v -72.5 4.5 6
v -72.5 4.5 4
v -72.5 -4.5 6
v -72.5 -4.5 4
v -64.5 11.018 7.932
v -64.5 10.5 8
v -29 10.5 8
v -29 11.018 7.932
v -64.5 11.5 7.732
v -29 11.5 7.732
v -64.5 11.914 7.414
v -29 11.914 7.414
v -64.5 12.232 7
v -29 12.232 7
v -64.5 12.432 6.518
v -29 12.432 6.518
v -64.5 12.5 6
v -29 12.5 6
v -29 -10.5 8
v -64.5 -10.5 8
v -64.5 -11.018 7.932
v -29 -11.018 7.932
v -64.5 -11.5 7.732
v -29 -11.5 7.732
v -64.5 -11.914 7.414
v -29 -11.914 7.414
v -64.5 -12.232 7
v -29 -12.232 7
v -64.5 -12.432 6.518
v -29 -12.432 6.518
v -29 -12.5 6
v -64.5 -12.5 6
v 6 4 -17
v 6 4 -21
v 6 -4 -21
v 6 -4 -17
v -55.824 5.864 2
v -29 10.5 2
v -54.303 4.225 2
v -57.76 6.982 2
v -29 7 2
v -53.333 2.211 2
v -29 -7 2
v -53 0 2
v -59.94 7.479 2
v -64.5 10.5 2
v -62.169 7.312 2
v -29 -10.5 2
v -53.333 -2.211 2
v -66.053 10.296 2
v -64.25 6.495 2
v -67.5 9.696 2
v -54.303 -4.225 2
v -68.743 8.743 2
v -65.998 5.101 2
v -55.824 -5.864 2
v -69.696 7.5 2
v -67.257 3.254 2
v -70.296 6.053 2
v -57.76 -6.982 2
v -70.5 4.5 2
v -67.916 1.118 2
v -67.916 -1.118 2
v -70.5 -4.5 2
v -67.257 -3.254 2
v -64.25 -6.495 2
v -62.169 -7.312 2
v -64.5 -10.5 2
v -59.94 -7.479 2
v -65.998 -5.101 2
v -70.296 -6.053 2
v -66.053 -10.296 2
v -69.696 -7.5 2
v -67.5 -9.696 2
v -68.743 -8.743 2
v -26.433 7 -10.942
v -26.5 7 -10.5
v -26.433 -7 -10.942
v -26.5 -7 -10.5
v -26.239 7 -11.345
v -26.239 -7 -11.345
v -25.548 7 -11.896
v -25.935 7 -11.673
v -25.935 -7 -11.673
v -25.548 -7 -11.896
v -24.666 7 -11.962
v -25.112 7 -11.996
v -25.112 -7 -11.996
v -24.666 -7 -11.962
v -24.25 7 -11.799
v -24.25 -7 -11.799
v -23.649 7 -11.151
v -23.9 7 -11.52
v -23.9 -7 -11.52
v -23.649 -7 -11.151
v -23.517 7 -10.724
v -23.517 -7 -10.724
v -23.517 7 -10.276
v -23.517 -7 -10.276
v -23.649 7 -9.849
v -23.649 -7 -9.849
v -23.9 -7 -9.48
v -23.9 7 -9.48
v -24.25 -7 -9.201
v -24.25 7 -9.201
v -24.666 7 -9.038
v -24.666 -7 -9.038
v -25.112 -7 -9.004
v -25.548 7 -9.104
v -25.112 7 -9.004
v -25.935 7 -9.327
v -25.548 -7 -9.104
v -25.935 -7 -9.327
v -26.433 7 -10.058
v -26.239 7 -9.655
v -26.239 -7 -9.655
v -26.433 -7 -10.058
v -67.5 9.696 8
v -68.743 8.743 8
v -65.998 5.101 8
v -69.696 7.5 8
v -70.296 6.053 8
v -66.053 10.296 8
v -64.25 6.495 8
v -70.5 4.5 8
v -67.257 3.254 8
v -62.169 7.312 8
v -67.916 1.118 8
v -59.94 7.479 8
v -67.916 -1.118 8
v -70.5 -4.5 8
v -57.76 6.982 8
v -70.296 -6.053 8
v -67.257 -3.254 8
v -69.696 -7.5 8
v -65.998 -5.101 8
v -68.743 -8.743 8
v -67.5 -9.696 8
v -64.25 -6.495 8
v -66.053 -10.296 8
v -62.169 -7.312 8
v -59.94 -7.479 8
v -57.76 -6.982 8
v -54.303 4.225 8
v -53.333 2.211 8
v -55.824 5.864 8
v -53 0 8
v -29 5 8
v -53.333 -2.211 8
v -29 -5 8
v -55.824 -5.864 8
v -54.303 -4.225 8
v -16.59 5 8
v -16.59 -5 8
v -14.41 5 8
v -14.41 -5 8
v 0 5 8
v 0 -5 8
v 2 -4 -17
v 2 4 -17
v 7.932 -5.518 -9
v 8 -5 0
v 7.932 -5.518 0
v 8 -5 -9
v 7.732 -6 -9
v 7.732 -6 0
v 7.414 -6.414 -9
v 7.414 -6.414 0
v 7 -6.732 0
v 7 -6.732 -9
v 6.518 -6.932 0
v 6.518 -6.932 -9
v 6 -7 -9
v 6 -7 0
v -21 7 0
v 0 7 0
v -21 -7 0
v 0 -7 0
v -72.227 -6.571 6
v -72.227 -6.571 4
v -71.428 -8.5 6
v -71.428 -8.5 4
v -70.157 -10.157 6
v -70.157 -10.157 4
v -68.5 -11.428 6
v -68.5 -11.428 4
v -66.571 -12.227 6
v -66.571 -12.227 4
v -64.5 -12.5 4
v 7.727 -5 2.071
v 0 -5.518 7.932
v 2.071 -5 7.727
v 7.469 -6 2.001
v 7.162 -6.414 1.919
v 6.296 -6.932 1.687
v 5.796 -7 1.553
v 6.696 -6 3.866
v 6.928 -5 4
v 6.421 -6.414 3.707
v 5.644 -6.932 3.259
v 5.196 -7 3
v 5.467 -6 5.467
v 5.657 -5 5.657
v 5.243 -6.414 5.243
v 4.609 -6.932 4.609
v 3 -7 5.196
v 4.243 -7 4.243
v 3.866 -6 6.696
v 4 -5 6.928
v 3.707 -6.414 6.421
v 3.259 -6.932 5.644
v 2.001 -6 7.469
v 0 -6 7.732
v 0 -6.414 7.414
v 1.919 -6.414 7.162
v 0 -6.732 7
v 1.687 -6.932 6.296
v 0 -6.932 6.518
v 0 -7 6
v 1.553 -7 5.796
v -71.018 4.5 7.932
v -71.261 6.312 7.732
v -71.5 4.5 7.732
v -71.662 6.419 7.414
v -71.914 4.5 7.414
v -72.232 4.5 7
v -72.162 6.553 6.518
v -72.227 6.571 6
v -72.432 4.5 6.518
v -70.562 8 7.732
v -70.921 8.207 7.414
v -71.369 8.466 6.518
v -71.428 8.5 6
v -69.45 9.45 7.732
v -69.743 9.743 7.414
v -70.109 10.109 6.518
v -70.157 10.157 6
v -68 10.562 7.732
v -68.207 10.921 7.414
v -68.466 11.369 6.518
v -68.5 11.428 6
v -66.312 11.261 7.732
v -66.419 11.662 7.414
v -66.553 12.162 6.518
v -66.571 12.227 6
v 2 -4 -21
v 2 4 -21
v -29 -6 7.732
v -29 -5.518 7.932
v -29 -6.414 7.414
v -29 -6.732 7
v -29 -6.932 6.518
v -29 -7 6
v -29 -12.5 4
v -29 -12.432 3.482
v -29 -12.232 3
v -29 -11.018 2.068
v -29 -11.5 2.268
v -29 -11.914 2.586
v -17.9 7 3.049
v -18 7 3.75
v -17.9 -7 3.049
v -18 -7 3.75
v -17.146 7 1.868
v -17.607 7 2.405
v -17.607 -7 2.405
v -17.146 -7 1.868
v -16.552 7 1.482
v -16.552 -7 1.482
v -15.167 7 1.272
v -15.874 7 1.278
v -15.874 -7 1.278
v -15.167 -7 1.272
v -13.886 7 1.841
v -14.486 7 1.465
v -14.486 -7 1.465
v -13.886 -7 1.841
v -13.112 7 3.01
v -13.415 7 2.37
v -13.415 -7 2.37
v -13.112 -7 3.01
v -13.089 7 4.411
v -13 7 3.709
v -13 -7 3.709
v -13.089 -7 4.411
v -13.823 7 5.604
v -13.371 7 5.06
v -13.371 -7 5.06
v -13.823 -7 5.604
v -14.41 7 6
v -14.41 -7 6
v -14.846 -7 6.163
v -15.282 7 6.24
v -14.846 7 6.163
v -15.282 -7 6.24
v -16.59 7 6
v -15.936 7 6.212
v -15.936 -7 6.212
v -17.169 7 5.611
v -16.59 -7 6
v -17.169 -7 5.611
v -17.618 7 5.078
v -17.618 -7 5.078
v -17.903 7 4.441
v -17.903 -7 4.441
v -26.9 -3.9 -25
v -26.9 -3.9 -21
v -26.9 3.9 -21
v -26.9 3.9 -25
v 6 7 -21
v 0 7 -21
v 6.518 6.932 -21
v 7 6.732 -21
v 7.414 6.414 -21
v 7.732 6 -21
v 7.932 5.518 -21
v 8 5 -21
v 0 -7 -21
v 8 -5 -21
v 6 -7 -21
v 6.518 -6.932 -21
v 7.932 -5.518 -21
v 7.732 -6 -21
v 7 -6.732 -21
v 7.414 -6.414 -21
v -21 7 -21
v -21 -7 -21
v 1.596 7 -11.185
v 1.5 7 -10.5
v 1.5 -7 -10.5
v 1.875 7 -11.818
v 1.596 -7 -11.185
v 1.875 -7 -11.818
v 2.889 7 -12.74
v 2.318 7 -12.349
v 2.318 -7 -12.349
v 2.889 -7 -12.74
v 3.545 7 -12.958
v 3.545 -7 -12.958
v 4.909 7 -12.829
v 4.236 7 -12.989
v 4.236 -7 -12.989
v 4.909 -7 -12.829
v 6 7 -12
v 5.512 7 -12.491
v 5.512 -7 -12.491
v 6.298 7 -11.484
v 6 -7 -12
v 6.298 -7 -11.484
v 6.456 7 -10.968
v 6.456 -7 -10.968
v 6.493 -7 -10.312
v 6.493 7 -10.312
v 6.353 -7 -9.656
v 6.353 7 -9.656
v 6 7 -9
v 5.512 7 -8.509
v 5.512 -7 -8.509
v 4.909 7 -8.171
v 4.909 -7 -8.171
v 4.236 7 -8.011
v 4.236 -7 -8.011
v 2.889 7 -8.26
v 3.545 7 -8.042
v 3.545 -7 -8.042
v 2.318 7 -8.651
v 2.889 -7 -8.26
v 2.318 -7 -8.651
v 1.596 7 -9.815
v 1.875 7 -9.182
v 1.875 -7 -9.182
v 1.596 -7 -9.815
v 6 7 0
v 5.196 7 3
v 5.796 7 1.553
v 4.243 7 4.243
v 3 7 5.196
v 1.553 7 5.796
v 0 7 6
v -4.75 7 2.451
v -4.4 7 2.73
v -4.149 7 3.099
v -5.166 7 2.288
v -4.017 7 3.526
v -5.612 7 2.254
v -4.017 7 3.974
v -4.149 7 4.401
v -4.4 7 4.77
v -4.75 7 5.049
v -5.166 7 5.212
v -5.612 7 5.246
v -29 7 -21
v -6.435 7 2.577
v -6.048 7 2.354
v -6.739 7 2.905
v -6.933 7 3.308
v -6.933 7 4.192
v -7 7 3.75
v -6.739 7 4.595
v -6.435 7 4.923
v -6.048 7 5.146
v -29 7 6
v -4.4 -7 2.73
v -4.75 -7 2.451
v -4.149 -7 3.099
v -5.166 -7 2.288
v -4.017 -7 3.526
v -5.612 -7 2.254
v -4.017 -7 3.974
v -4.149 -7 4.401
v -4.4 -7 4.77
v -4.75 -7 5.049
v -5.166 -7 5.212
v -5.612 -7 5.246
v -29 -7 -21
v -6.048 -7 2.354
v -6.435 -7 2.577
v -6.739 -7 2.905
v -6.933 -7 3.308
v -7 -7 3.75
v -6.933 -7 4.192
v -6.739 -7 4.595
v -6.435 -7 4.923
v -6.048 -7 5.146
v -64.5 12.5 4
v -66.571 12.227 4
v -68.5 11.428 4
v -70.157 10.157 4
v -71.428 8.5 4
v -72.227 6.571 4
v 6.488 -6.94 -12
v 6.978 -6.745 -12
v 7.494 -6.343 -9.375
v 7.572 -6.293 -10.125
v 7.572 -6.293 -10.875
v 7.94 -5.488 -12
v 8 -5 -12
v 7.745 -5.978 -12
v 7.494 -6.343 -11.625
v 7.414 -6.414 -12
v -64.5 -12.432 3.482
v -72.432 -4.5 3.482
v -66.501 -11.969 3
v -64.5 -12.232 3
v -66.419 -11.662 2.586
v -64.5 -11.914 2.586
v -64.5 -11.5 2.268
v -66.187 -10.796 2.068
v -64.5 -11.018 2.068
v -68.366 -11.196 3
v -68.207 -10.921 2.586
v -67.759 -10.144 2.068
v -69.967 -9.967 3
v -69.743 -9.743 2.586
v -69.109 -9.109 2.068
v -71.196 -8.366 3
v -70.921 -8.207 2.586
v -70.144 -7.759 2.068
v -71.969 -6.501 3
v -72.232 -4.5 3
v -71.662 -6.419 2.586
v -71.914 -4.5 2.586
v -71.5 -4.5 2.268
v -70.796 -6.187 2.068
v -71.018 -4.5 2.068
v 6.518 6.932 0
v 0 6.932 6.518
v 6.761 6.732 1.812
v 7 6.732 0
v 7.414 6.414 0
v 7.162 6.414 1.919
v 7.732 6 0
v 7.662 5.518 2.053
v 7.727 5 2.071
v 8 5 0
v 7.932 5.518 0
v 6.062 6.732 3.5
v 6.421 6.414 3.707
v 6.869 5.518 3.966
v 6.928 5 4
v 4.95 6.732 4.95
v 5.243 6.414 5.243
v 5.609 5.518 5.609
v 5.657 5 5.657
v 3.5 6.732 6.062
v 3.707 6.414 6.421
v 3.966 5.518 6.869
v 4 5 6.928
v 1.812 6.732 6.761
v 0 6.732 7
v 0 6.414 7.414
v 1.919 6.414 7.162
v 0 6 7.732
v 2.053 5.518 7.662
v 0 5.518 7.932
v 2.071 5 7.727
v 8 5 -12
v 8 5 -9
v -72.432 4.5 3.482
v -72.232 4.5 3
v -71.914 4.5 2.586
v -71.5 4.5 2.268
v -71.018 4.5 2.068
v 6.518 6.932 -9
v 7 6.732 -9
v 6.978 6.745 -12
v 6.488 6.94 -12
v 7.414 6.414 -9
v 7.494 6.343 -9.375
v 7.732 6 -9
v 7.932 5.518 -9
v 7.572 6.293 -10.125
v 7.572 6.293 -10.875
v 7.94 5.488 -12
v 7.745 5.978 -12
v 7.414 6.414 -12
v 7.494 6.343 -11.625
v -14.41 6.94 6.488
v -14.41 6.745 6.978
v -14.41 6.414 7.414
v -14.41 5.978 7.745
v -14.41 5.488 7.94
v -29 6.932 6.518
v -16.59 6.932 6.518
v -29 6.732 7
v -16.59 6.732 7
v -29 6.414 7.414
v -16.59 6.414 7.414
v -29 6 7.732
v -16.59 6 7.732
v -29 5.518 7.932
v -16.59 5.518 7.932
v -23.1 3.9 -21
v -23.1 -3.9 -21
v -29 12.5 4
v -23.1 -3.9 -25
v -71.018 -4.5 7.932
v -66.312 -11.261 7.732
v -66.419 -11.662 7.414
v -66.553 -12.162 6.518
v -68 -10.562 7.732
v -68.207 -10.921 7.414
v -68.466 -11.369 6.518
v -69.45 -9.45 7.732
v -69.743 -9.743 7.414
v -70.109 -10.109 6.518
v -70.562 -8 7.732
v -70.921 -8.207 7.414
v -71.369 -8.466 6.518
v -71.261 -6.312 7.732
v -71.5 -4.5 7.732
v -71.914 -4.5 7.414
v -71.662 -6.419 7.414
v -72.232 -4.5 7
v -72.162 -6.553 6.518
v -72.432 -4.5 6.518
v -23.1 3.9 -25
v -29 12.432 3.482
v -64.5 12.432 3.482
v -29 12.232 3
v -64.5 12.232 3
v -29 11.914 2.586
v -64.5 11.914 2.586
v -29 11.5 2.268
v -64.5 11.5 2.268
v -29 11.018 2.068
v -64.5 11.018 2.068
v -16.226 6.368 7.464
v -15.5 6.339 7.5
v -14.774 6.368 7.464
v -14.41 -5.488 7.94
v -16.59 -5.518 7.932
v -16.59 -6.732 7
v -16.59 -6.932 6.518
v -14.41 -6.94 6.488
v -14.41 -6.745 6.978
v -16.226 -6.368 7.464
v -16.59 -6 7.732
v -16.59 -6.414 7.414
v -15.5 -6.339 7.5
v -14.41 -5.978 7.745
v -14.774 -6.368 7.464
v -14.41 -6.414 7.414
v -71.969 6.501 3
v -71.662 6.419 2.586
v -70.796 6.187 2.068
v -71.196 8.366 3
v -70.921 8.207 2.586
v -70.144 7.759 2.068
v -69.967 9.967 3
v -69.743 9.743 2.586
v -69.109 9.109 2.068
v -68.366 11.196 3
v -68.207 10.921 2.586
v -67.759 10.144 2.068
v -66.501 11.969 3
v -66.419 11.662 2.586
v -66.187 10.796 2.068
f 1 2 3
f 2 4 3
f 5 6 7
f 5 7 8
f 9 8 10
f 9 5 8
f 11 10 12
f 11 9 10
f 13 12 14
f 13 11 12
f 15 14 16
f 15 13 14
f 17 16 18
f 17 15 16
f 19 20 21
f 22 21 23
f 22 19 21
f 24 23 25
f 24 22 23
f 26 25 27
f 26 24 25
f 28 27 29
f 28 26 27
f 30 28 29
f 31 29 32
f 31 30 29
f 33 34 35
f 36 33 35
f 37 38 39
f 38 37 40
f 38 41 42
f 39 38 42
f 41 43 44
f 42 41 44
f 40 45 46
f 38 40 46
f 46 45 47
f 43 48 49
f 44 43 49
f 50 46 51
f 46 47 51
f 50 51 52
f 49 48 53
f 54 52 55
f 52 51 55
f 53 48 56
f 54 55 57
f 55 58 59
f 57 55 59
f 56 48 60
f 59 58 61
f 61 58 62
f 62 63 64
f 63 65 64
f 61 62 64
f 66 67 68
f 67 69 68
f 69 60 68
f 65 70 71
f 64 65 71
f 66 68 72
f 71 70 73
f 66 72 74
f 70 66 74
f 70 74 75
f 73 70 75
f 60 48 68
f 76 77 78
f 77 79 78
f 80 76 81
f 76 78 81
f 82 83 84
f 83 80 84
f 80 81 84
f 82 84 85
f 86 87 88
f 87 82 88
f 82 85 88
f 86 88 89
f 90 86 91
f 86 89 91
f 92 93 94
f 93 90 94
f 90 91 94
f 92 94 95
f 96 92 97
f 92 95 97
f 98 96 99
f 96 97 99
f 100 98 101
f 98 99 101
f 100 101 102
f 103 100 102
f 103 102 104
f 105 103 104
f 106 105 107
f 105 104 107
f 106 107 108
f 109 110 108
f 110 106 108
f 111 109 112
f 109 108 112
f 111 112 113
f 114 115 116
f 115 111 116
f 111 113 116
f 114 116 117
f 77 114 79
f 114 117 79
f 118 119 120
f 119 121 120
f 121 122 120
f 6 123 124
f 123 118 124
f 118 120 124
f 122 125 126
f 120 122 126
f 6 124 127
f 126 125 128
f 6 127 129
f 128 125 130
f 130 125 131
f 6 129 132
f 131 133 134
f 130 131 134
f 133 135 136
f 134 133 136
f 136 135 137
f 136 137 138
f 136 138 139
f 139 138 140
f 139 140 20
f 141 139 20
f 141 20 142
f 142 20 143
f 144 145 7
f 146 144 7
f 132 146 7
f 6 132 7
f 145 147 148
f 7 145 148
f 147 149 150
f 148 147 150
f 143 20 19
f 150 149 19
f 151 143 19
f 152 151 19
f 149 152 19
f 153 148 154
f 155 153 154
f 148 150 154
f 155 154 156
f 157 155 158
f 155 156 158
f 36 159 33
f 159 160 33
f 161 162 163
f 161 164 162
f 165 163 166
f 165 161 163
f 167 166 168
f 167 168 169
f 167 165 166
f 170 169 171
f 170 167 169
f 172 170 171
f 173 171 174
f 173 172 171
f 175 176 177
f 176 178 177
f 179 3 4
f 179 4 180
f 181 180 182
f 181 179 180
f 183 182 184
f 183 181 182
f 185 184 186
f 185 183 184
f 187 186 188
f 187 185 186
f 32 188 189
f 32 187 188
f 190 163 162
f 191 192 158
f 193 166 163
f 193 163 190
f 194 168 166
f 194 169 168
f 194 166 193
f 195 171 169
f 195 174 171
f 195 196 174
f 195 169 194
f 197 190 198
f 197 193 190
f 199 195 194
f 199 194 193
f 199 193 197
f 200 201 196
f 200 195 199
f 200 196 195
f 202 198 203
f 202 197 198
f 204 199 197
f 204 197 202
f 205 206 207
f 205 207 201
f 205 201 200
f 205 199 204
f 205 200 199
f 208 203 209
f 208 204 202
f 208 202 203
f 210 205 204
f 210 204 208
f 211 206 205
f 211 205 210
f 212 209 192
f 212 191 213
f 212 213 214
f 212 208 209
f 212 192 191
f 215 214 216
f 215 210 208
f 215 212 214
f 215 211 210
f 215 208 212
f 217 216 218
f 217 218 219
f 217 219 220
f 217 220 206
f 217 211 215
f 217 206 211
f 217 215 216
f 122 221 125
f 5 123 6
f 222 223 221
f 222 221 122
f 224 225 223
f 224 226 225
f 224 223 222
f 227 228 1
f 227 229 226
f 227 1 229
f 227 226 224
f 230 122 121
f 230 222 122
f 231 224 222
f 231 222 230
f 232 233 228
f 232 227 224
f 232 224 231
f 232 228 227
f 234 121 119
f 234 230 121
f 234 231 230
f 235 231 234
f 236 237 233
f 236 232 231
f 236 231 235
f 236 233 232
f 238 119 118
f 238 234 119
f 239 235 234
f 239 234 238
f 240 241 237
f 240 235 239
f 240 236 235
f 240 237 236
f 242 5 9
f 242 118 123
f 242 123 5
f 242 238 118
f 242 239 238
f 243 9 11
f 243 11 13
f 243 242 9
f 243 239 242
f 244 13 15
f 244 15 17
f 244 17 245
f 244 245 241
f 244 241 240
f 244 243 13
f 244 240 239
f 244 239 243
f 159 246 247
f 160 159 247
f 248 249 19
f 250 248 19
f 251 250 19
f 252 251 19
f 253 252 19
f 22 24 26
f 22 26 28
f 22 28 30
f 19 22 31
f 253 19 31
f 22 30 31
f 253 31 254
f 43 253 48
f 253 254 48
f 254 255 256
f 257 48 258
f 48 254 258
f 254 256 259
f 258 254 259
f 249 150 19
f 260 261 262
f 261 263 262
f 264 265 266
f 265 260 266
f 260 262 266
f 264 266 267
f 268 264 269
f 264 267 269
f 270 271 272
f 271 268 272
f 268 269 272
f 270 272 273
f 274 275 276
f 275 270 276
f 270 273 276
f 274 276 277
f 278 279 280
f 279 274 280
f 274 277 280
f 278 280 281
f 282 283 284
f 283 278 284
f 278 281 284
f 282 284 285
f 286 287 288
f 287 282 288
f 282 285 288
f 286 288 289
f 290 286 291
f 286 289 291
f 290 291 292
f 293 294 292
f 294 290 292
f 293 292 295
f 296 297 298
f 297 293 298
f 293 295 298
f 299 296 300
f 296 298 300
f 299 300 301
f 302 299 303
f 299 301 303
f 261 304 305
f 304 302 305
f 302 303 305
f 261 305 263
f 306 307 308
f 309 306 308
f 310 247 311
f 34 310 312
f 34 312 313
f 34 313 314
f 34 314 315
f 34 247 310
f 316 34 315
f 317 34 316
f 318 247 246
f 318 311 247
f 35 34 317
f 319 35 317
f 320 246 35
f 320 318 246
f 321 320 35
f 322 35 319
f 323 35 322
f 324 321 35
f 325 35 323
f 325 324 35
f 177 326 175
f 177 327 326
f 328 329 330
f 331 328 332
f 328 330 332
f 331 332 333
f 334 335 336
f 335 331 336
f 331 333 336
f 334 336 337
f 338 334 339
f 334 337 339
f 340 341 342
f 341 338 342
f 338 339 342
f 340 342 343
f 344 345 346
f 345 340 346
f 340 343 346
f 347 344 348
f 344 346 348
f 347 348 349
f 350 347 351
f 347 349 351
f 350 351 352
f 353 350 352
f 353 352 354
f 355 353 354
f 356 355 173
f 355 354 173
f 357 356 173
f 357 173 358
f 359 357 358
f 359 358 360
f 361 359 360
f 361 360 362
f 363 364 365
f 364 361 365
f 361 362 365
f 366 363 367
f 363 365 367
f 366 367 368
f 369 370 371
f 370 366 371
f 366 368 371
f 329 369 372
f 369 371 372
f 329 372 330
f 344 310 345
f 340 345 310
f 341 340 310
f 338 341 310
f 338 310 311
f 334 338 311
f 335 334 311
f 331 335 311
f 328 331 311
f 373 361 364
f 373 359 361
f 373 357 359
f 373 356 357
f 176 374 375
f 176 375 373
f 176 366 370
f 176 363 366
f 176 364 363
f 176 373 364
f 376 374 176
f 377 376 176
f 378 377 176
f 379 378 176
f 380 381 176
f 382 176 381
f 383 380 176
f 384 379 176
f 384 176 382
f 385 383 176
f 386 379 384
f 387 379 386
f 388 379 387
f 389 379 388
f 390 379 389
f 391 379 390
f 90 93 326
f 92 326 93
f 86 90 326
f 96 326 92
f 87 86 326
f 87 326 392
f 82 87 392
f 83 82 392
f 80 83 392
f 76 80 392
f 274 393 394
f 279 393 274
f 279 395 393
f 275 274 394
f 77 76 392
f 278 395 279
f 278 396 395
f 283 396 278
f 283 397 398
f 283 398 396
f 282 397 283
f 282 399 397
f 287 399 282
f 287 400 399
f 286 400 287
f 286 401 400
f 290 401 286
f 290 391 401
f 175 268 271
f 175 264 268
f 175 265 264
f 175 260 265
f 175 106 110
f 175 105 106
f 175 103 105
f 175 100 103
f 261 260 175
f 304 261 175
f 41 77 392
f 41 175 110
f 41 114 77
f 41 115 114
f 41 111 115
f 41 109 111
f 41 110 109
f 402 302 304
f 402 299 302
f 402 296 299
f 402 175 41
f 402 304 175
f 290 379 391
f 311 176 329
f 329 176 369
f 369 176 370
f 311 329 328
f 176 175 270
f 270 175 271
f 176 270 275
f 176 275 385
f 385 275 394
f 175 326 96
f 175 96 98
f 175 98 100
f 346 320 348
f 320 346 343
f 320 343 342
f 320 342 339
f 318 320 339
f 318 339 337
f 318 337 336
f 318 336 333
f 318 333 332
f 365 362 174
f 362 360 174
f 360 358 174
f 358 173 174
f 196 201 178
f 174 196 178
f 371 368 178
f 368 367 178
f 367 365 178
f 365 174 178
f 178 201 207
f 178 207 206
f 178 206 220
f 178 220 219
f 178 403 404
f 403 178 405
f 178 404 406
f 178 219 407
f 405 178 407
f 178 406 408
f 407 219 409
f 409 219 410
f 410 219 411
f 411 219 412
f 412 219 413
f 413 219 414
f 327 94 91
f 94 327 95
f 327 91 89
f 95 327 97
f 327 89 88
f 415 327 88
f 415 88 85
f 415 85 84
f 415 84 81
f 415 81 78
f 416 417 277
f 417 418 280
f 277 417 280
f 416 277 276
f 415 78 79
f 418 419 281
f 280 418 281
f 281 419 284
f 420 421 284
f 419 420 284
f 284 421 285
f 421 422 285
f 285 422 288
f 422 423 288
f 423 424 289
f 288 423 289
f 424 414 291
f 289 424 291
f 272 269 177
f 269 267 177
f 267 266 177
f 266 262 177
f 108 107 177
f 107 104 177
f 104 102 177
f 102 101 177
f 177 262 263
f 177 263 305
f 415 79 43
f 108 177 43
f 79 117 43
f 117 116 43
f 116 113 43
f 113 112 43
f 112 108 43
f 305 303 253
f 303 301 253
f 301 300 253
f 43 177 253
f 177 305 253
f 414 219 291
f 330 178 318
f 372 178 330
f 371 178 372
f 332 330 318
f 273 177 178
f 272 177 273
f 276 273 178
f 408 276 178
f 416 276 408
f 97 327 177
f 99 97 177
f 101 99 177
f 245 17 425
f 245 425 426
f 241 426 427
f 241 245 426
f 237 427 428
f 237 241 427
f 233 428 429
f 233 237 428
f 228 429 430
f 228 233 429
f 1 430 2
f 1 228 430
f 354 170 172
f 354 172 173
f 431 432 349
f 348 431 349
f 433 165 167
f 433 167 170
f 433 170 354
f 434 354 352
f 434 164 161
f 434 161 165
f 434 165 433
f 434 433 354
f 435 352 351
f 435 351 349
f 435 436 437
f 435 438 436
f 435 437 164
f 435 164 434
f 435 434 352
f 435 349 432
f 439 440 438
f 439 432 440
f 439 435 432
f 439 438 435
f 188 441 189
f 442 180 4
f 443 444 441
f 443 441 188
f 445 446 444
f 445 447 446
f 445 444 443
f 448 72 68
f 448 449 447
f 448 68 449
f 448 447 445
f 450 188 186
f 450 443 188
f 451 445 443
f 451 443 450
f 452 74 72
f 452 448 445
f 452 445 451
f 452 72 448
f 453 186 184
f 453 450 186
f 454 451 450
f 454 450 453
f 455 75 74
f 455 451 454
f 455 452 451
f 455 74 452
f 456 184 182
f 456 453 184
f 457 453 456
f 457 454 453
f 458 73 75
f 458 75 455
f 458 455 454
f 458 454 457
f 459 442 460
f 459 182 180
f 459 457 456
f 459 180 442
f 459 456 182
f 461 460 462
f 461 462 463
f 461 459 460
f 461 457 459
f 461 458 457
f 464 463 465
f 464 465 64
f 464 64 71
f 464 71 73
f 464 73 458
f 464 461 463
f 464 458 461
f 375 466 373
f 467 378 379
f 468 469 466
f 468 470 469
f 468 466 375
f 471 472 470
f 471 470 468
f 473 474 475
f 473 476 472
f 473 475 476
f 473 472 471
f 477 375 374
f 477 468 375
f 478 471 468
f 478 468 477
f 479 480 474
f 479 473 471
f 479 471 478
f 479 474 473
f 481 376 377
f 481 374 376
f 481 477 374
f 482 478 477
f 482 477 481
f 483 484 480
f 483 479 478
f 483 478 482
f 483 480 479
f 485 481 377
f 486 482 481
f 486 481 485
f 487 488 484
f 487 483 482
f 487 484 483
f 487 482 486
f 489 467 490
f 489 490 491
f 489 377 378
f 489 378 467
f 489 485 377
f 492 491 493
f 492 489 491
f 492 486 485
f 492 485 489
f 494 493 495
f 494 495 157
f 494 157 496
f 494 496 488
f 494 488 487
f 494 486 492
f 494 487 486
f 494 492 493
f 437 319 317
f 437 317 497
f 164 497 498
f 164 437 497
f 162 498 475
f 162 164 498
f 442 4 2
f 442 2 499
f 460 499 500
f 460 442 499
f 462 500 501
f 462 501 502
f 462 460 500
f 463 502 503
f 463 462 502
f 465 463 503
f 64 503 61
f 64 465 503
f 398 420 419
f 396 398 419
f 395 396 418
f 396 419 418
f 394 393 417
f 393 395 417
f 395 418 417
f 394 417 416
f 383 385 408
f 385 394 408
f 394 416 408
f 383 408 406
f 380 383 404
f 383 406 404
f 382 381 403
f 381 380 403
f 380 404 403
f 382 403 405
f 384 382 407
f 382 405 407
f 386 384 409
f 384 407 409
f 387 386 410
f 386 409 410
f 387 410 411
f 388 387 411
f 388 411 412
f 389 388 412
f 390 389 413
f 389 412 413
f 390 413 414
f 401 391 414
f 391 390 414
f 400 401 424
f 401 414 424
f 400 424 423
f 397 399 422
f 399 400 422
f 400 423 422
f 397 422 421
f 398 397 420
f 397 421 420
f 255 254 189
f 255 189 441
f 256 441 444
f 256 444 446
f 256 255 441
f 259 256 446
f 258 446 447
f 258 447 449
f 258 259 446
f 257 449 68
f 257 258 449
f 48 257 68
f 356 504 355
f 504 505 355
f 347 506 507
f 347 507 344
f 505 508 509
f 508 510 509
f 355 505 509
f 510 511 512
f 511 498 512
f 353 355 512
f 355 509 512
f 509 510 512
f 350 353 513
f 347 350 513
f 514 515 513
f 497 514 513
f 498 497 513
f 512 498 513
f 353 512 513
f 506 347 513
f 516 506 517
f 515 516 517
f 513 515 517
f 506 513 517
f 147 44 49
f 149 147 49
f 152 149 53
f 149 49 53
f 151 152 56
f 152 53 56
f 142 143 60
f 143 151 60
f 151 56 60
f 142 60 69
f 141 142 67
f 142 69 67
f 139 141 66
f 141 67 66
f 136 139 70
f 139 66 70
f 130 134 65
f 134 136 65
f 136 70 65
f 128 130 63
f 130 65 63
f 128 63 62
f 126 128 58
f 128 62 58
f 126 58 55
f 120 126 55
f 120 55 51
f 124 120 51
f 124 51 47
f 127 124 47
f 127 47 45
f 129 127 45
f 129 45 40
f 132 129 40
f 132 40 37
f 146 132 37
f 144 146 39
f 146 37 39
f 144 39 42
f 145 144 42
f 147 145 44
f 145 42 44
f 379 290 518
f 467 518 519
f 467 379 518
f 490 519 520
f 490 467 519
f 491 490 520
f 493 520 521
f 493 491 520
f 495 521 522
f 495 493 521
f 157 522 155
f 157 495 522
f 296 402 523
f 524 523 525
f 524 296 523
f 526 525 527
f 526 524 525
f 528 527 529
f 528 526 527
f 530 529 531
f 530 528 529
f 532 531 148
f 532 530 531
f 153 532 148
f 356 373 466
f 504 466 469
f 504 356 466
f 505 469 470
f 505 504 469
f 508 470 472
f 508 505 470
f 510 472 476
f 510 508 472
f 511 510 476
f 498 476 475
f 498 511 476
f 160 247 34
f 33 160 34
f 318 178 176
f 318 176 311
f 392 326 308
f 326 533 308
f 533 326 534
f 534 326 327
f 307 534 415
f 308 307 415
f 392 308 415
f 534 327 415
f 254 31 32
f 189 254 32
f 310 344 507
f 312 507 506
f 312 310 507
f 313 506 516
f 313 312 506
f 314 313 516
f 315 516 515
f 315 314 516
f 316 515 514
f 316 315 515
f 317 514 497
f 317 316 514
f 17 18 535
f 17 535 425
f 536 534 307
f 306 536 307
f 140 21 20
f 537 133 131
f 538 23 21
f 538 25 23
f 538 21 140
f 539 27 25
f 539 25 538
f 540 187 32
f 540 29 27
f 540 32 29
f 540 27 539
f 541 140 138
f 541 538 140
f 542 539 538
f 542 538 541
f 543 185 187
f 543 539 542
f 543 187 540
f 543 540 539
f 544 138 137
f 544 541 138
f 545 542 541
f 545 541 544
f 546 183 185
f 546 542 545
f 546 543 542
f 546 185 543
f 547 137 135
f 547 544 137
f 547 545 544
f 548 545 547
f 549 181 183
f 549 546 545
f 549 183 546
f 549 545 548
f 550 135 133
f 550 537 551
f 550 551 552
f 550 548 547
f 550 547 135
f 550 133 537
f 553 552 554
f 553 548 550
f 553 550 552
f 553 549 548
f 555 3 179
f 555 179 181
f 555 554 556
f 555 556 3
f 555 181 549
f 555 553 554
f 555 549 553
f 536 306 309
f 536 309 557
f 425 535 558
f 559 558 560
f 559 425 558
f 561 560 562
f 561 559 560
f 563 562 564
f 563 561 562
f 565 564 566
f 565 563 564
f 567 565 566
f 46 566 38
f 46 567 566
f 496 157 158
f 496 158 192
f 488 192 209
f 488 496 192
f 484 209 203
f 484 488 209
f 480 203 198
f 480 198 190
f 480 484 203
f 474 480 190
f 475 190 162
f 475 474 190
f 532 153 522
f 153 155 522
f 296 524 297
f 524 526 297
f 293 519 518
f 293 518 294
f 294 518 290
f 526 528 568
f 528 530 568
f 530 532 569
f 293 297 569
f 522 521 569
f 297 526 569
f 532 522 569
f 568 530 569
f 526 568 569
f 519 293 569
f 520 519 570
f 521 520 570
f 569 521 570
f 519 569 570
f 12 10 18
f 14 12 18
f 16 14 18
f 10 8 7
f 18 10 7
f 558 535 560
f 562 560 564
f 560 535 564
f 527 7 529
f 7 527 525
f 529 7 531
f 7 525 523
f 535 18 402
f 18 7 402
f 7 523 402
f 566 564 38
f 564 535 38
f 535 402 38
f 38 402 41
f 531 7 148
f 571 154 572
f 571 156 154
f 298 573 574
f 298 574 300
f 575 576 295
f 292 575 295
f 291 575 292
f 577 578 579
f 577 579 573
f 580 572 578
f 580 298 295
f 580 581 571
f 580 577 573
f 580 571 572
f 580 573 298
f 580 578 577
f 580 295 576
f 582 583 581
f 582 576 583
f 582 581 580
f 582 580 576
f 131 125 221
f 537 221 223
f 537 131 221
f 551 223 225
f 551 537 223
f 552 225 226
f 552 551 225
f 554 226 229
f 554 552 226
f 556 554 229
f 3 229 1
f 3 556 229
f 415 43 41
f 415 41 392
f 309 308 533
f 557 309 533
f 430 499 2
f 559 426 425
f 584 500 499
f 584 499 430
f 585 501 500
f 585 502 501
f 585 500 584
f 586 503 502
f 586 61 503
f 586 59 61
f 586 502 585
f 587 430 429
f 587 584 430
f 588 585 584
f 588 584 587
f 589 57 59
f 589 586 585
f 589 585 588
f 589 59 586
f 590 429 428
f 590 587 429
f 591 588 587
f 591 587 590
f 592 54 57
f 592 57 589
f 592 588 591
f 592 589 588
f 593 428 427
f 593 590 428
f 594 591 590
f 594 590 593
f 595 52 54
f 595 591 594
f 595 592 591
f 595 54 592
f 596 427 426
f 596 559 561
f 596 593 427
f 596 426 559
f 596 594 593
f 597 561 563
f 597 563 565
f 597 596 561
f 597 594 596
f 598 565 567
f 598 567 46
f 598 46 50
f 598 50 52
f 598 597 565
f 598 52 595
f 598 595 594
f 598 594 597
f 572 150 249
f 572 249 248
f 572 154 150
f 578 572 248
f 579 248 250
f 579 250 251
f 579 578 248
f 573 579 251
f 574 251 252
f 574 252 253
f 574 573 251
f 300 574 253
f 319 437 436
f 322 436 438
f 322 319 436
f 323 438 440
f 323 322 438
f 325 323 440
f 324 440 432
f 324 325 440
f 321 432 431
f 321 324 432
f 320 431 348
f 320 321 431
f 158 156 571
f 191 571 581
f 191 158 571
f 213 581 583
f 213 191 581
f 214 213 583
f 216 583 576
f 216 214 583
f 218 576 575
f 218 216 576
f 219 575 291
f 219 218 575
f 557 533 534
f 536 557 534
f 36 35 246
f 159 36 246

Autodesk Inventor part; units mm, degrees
ref_plane "YZ Plane" through (0, 0, 0) normal (1, 0, 0) x (0, 1, 0)
sketch "Sketch1" plane through (0, 0, 0) normal (0, 1, 0) x (-1, 0, 0)
  line L0 (0, 0) -> (21, 0)
  circle A0 centre (5.5, 3.75) radius 1.5
  line L1 (29, 8) -> (-8, 8)
  line L2 (10.5, 8) -> (10.5, 0) construction
  line L3 (0, -21) -> (-8, -21)
  line L4 (29, 2) -> (72.5, 2)
  line L5 (72.5, 2) -> (72.5, 8)
  line L6 (72.5, 8) -> (29, 8)
  line L7 (29, 8) -> (29, 2)
  line L8 (21, 0) -> (21, 8)
  line L9 (0, 0) -> (0, 8)
  circle A1 centre (15.5, 3.75) radius 2.5
  line L10 (0, 0) -> (0, -21)
  line L11 (-8, -21) -> (-8, 8)
  line L12 (21, -21) -> (21, 0)
  line L13 (29, -21) -> (29, 2)
  line L14 (21, -21) -> (29, -21)
  circle A2 centre (-4, -10.5) radius 2.5
  circle A3 centre (25, -10.5) radius 1.5
  point P0 (29, 8)
  point P1 (21, 8)
  point P2 (-4, -21)
  dimension "d1" = 21
  dimension "d15" = 3.75
  dimension "d16" = 5
  dimension "d51" = 6
  dimension "d148" = 5
  dimension "d149" = 3.75
  dimension "d150" = 5
  dimension "d151" = 3
  dimension "d152" = 8
  dimension "d154" = 37
  dimension "d155" = 10.5
  dimension "d158" = 21
  dimension "d160" = 8
  dimension "d162" = 8
  dimension "d164" = 21
  dimension "d165" = 29
  dimension "d166" = 29
  dimension "d169" = 62
  dimension "d170" = 4
  dimension "d171" = 5
  dimension "d172" = 10.5
  dimension "d173" = 4
  dimension "d174" = 3
  dimension "d175" = 10.5
extrude "Extrusion1" add sketch "Sketch1" along normal mid plane 14 contours L9 L1 L8 L0 | L10 L3 L11 L1 L9 | L8 L1 L7 L13 L14 L12
extrude "Extrusion2" add sketch "Sketch1" along normal mid plane 25 contours L6 L5 L4 L7
fillet "Fillet4" radius 8 3 edges at (-72.5, 12.5, 5) (-72.5, -12.5, 5) (8, 0, 8)
ref_plane "Work Plane3" through (0, 0, 2) normal (0, 0, 1) x (1, 0, 0)
sketch "Sketch5" plane through (0, 0, 2) normal (0, 0, 1) x (1, 0, 0)
  line L0 (-29, -7) -> (-29, 7) projected
  circle A0 centre (-60.5, 0) radius 7.5
  line L1 (-21, -7) -> (0, -7) projected
  line L2 (-29, 12.5) -> (-64.5, 12.5) projected
  point P0 (0, 0)
  point P1 (-12.116, -8.0773)
  point P2 (-29, 0)
  point P3 (-10.5, -7)
  dimension "d195" = 15
  dimension "d196" = 50
  dimension "d197" = 12.5
extrude "Extrusion6" cut sketch "Sketch5" along normal blind 6
fillet "Fillet12" radius 2 13 edges at (-72.5, 0, 8) (-46.75, 12.5, 8) (-70.1569, -10.1569, 2) (-72.5, 0, 2) (-70.1569, 10.1569, 2) (-46.75, 12.5, 2) (-46.75, -12.5, 2) (5.6569, 7, 5.6569) (8, 7, -10.5) (-14.5, 7, 8) (5.6569, -7, 5.6569) (8, -7, -10.5) (-14.5, -7, 8)
ref_plane "Work Plane4" through (0, 0, -21) normal (0, 0, 1) x (1, 0, 0)
sketch "Sketch6" plane through (0, 0, -21) normal (0, 0, 1) x (1, 0, 0)
  line L0 (6, -4) -> (2, -4)
  line L1 (2, -4) -> (2, 4)
  line L2 (2, 4) -> (6, 4)
  line L3 (6, 4) -> (6, -4)
  line L4 (6, -4) -> (2, 4) construction
  line L5 (2, -4) -> (6, 4) construction
  line L6 (0, -7) -> (0, 7) projected
  line L7 (-23.1, -3.9) -> (-26.9, -3.9)
  line L8 (-26.9, -3.9) -> (-26.9, 3.9)
  line L9 (-26.9, 3.9) -> (-23.1, 3.9)
  line L10 (-23.1, 3.9) -> (-23.1, -3.9)
  line L11 (-23.1, -3.9) -> (-26.9, 3.9) construction
  line L12 (-26.9, -3.9) -> (-23.1, 3.9) construction
  line L13 (-21, -7) -> (-21, 7) projected
  point P0 (0, 0)
  point P1 (4, 0)
  point P2 (0, 0)
  point P3 (0, 0)
  point P4 (-25, 0)
  point P5 (-21, 0)
  dimension "d183" = 8
  dimension "d184" = 4
  dimension "d185" = 4
  dimension "d186" = 0
  dimension "d187" = 7.8
  dimension "d188" = 3.8
  dimension "d189" = 4
  dimension "d190" = 0
extrude "Extrusion12" add sketch "Sketch6" against normal blind 4 contours L7 L8 L9 L10
extrude "Extrusion13" cut sketch "Sketch6" along normal blind 4 contours L0 L1 L2 L3
equation "\"HoleDiameter\" = 3"
equation "\"InsertDiameter\" = 5"
equation "\"CoxaWidth\" = 25"
equation "\"SlotWidth1\" = 4"
equation "\"SlotLength1\" = 8"
equation "\"SlotHeight1\" = 4"
properties part number "ServoMount"
